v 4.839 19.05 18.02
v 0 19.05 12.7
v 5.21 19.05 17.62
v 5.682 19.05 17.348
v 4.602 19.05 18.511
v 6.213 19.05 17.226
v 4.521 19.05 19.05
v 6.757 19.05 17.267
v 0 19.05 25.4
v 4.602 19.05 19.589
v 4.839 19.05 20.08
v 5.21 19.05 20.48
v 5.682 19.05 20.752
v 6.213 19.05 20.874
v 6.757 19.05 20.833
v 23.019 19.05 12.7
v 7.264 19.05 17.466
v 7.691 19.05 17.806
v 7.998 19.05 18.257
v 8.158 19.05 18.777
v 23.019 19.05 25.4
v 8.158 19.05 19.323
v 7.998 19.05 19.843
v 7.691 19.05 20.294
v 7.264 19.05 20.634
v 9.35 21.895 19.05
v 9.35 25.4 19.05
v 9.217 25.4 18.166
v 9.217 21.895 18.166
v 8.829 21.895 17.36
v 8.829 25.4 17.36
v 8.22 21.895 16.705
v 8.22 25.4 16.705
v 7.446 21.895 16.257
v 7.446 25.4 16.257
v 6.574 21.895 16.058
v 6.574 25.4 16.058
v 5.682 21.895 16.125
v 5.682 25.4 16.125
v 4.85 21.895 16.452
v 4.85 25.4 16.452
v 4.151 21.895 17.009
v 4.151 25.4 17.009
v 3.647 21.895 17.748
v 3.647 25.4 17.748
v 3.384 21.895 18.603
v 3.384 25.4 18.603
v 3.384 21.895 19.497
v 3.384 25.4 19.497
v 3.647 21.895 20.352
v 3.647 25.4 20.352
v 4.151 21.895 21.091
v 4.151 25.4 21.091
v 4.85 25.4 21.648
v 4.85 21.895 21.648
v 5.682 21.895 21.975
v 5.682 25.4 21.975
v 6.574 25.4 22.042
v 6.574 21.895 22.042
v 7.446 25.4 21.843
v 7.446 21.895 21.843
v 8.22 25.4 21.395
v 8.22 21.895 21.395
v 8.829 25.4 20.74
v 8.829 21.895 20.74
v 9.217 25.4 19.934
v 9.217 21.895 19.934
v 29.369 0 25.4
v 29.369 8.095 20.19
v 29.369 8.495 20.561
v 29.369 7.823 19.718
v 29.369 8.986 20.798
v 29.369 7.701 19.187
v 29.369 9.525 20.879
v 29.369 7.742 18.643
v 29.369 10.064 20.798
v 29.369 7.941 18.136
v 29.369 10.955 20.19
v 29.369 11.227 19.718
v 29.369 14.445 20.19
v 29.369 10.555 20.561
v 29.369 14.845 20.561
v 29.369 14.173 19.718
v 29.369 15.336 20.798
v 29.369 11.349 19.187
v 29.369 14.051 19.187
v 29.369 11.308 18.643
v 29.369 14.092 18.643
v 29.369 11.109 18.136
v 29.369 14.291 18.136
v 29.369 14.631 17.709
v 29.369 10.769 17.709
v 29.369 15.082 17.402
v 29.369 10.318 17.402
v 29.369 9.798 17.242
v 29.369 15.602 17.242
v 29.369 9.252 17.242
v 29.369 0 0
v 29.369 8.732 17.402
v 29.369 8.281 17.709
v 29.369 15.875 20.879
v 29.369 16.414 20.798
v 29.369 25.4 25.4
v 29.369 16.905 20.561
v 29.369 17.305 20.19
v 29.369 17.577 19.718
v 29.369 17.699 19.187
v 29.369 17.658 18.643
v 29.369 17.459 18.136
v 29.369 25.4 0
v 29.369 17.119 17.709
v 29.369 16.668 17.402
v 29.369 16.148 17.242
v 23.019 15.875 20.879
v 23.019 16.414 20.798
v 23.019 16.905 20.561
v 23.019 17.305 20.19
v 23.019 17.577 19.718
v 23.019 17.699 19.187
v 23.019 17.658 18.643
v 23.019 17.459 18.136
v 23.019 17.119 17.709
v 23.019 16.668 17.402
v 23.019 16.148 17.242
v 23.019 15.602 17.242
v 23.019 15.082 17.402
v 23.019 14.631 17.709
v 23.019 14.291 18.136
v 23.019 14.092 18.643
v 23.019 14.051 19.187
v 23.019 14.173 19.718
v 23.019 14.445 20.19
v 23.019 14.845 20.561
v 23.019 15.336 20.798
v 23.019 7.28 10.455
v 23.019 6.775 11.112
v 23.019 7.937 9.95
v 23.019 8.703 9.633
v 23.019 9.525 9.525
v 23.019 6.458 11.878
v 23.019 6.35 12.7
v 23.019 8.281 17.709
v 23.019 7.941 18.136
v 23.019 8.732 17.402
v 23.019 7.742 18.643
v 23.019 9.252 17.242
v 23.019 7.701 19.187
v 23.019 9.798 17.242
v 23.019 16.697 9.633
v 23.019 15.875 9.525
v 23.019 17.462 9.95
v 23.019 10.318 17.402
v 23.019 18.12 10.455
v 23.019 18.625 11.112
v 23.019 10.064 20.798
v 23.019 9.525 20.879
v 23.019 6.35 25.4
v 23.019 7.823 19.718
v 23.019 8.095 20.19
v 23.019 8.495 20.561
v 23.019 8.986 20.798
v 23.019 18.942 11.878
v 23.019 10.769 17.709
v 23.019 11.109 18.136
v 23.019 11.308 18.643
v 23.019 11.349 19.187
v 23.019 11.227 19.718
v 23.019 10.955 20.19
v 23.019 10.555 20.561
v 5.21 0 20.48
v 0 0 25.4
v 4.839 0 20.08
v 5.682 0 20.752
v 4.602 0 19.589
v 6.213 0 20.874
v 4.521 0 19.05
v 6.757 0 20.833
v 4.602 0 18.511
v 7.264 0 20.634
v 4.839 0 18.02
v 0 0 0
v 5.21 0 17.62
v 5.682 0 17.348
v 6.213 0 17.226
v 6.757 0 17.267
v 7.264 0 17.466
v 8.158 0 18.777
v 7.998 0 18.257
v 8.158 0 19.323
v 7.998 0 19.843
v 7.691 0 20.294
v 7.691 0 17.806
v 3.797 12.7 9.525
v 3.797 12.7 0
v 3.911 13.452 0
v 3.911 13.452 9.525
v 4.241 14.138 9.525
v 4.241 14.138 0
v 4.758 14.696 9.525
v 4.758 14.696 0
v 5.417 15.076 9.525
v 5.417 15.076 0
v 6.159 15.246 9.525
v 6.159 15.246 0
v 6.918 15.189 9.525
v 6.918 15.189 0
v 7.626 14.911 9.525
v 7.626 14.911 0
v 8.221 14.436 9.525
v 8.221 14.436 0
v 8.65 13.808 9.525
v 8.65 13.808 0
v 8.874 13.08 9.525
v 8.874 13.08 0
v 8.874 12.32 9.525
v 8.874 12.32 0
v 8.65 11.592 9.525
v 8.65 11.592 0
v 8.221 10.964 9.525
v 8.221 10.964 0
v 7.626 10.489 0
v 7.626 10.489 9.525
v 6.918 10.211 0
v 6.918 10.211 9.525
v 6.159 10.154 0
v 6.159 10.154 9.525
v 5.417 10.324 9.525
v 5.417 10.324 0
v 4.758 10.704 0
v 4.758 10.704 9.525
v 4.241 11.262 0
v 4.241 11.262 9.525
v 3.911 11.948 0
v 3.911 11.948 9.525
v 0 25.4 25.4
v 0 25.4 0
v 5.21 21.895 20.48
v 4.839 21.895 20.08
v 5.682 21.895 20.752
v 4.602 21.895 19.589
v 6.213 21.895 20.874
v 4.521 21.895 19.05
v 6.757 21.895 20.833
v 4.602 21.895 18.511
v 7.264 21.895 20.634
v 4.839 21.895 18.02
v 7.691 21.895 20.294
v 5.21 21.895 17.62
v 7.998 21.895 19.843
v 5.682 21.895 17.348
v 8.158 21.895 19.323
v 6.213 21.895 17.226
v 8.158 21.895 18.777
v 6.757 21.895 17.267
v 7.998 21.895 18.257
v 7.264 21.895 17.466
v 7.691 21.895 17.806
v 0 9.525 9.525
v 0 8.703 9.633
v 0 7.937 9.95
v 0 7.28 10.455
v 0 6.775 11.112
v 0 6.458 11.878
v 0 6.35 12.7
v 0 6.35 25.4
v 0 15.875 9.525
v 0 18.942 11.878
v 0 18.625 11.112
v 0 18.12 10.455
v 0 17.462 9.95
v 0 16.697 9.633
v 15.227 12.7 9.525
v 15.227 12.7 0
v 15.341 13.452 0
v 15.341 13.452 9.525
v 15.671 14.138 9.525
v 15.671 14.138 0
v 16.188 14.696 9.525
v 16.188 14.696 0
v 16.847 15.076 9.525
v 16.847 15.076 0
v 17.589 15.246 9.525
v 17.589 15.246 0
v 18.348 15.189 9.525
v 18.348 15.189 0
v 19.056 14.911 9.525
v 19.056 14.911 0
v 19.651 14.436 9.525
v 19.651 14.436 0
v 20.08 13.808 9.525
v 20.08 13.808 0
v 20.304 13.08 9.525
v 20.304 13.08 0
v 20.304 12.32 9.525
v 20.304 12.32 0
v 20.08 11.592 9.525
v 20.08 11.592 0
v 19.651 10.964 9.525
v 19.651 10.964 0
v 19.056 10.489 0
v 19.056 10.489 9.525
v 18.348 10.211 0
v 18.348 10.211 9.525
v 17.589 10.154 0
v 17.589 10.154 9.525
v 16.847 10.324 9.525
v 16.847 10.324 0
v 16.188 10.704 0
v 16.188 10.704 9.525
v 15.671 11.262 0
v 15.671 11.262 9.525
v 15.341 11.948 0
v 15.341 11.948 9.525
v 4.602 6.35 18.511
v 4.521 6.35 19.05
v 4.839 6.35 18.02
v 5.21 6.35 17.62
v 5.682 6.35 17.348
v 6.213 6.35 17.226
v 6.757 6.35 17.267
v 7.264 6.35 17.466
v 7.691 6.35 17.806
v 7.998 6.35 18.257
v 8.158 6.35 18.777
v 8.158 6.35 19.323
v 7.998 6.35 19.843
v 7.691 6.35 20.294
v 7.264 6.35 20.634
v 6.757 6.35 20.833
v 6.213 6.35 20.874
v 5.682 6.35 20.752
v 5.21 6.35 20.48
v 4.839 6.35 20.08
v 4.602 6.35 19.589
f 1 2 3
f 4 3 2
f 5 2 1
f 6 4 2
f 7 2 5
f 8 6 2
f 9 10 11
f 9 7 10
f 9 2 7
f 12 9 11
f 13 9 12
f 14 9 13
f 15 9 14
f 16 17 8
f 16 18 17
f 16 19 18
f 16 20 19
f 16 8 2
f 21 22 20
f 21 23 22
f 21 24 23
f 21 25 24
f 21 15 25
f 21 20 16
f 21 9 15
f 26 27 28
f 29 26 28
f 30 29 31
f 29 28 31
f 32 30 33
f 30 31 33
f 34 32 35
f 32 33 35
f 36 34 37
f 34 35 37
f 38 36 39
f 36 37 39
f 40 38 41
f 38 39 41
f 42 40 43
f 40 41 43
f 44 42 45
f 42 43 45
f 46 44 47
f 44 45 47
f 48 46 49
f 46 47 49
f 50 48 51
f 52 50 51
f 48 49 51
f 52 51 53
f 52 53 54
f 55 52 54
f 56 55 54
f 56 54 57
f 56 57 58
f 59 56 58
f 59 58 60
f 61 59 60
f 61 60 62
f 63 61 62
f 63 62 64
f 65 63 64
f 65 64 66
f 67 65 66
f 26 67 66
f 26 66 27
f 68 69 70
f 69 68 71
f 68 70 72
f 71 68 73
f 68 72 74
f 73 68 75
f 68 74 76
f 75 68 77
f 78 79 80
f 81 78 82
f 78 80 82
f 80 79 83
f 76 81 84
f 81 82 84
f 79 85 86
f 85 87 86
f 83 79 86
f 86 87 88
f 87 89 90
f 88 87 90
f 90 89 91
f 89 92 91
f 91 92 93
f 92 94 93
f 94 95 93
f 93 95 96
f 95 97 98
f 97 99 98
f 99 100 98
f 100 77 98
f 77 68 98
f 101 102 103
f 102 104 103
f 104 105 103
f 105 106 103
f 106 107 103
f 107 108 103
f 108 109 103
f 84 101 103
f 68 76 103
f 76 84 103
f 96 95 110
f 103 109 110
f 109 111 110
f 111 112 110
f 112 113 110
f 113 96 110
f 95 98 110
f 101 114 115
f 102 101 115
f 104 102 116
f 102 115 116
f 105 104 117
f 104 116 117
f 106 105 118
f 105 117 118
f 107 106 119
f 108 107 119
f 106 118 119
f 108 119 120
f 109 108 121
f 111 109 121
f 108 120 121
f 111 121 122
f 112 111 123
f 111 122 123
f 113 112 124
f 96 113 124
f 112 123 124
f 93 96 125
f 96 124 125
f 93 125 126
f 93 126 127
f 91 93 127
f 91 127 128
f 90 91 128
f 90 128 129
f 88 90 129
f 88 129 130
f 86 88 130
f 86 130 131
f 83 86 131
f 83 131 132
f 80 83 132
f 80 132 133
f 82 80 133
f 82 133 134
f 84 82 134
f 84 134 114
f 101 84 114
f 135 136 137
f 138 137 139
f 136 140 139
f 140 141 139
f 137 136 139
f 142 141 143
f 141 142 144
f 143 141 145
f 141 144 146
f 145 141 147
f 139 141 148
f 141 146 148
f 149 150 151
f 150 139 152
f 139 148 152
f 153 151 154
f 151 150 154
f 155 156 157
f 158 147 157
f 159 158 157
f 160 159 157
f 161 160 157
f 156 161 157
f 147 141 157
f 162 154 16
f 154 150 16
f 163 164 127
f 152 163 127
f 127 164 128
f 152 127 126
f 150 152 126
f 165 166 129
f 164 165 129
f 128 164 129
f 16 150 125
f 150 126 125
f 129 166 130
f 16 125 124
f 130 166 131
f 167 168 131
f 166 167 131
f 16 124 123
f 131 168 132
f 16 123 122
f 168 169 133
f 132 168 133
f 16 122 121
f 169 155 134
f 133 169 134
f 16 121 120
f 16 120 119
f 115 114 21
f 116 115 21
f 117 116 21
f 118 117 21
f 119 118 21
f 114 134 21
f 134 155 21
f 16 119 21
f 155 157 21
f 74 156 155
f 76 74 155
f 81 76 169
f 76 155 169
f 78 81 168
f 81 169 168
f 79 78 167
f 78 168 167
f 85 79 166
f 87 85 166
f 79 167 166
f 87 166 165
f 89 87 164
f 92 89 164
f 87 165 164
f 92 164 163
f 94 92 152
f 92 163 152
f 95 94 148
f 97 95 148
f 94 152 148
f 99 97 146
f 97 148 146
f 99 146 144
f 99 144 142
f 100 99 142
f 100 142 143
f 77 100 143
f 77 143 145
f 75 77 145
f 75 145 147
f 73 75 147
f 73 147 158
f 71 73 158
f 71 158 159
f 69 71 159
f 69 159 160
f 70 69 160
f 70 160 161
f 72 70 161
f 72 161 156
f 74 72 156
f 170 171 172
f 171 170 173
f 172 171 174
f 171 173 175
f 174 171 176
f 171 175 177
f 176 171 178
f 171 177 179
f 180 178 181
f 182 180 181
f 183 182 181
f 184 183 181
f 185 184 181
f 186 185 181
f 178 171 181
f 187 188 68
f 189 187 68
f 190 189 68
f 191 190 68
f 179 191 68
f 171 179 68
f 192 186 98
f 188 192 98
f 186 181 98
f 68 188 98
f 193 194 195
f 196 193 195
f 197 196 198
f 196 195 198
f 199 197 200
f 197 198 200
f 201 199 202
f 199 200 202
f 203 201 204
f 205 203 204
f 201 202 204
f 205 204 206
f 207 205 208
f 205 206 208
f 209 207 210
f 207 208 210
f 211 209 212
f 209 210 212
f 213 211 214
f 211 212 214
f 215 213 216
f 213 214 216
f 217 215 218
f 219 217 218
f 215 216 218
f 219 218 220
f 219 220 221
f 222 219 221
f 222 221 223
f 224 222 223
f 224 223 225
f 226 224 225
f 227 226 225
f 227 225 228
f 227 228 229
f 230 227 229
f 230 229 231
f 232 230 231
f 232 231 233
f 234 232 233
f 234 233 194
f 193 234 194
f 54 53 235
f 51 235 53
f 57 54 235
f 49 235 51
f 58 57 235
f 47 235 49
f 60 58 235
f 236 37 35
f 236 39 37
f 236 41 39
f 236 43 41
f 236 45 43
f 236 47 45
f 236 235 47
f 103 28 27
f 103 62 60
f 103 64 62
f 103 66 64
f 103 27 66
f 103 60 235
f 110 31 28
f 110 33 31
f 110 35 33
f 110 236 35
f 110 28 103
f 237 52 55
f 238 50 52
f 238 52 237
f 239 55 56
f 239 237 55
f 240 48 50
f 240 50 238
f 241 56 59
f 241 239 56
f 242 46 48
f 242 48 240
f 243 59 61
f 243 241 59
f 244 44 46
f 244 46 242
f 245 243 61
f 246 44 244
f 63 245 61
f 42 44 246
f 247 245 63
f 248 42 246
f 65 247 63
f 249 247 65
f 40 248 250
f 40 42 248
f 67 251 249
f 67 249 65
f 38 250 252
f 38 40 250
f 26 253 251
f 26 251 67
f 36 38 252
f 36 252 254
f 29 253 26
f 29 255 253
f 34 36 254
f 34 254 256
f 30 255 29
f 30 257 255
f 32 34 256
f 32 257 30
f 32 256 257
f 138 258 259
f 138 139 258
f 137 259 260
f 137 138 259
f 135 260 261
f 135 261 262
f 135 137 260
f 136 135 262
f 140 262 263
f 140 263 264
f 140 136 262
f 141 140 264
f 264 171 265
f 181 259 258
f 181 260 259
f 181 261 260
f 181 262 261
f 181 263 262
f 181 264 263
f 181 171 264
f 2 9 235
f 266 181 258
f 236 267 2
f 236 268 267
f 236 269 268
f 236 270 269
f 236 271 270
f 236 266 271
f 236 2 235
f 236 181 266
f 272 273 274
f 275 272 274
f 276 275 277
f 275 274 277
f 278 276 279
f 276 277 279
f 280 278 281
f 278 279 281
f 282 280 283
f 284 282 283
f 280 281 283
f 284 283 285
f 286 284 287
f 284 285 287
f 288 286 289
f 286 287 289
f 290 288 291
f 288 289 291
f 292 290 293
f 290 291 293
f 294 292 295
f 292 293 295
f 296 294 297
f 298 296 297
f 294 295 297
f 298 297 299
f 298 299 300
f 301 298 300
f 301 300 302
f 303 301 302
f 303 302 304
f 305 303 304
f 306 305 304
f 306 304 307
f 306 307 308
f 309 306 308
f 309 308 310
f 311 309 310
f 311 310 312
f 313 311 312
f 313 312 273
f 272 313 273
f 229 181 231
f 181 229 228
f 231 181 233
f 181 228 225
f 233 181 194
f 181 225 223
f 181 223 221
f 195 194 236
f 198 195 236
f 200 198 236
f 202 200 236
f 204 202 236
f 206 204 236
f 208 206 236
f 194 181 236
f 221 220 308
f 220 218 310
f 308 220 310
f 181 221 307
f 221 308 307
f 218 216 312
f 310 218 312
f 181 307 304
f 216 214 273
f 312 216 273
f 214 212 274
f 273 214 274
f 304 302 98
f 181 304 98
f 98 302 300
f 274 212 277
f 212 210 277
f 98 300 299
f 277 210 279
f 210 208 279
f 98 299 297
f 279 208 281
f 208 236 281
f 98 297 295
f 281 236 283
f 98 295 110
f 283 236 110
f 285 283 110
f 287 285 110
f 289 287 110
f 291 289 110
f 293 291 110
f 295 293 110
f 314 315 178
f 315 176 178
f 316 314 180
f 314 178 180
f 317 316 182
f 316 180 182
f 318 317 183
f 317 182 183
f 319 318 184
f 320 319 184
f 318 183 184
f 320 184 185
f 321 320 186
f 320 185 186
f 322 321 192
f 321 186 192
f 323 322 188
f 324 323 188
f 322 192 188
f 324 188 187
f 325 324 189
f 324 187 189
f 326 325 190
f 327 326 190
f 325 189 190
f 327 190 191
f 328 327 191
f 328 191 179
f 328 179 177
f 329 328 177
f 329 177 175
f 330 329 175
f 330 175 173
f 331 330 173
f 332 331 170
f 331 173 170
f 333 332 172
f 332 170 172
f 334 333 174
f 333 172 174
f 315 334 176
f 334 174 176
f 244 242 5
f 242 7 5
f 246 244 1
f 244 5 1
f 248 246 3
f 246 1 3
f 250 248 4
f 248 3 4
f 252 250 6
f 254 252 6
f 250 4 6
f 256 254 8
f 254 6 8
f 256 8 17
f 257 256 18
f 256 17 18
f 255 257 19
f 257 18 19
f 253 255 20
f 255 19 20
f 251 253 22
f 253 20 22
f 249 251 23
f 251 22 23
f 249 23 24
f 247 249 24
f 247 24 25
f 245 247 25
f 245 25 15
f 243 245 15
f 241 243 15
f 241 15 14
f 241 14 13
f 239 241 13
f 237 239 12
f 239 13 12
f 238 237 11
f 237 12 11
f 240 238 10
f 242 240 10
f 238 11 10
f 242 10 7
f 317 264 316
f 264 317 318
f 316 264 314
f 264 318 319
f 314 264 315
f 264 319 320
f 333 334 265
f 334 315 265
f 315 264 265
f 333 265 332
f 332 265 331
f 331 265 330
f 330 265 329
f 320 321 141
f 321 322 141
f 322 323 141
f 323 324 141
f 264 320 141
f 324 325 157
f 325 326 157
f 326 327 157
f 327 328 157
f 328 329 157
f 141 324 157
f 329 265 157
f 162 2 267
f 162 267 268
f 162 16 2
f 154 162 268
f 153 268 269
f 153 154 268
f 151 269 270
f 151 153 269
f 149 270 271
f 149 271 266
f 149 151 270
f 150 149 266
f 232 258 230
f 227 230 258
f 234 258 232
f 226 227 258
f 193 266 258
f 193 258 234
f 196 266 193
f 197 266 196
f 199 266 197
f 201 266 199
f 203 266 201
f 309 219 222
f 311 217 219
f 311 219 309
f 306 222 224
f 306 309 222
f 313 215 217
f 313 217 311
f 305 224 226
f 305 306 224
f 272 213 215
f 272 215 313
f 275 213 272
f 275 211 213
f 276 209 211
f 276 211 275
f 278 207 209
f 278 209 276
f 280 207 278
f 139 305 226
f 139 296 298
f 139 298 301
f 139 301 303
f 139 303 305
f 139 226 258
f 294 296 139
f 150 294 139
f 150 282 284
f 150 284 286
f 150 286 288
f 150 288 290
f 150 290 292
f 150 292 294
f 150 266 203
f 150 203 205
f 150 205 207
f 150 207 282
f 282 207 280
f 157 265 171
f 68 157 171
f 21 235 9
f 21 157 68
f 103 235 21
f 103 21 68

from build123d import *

# Parameters (mm, degrees)
SKETCH1_W                                      = 29.36875
SKETCH1_H                                      = 25.4
BOSS_EXTRUDE1_DEPTH                            = 25.4
SKETCH2_W                                      = 23.01875
SKETCH2_H                                      = 12.7
CUT_EXTRUDE1_DEPTH                             = 15.875
CBORE_FOR_6_SOCKET_HEAD_CAP_SCREW1_D           = 3.6576
CBORE_FOR_6_SOCKET_HEAD_CAP_SCREW1_CBORE_D     = 5.999999938
CBORE_FOR_6_SOCKET_HEAD_CAP_SCREW1_CBORE_DEPTH = 3.5052
F_6_CLEARANCE_HOLE2_D                          = 3.6576
FILLET1_R                                      = 3.175
TAP_DRILL_FOR_1_4_20_TAP2_D                    = 5.1054


with BuildPart() as part:
    # Sketch1 → Boss-Extrude1 (new body)
    with BuildSketch(Plane.XY):
        with Locations((14.684375, 12.7)):
            Rectangle(SKETCH1_W, SKETCH1_H)
    extrude(amount=BOSS_EXTRUDE1_DEPTH)

    # Sketch2 → Cut-Extrude1 (cut)
    with BuildSketch(Plane.XY.offset(25.4)):
        with Locations((11.509375, 12.7)):
            Rectangle(SKETCH2_W, SKETCH2_H)
    extrude(amount=-CUT_EXTRUDE1_DEPTH, mode=Mode.SUBTRACT)

    # CBORE for #6 Socket Head Cap Screw1 (through all)
    with Locations(Plane(origin=(0, 25.4, 0), x_dir=(1, 0, 0), z_dir=(0, 1, 0))):
        with Locations((6.35, -19.05)):
            CounterBoreHole(CBORE_FOR_6_SOCKET_HEAD_CAP_SCREW1_D / 2, CBORE_FOR_6_SOCKET_HEAD_CAP_SCREW1_CBORE_D / 2, CBORE_FOR_6_SOCKET_HEAD_CAP_SCREW1_CBORE_DEPTH)

    # #6 Clearance Hole2 (through all)
    with Locations(Plane(origin=(29.36875, 0, 0), x_dir=(0, 0, -1), z_dir=(1, 0, 0))):
        with Locations((-19.05, 15.875), (-19.05, 9.525)):
            Hole(F_6_CLEARANCE_HOLE2_D / 2)

    # Fillet1
    fillet1_edges = [part.edges().sort_by_distance(p)[0] for p in [
        (11.509375, 19.05, 9.525),
        (11.509375, 6.35, 9.525),
    ]]
    fillet(fillet1_edges, radius=FILLET1_R)

    # Tap Drill for 1/4-20 Tap2 (through all)
    with Locations(Plane.XY.offset(9.525)):
        with Locations((6.35, 12.7), (17.78, 12.7)):
            Hole(TAP_DRILL_FOR_1_4_20_TAP2_D / 2)


solid = part.part
